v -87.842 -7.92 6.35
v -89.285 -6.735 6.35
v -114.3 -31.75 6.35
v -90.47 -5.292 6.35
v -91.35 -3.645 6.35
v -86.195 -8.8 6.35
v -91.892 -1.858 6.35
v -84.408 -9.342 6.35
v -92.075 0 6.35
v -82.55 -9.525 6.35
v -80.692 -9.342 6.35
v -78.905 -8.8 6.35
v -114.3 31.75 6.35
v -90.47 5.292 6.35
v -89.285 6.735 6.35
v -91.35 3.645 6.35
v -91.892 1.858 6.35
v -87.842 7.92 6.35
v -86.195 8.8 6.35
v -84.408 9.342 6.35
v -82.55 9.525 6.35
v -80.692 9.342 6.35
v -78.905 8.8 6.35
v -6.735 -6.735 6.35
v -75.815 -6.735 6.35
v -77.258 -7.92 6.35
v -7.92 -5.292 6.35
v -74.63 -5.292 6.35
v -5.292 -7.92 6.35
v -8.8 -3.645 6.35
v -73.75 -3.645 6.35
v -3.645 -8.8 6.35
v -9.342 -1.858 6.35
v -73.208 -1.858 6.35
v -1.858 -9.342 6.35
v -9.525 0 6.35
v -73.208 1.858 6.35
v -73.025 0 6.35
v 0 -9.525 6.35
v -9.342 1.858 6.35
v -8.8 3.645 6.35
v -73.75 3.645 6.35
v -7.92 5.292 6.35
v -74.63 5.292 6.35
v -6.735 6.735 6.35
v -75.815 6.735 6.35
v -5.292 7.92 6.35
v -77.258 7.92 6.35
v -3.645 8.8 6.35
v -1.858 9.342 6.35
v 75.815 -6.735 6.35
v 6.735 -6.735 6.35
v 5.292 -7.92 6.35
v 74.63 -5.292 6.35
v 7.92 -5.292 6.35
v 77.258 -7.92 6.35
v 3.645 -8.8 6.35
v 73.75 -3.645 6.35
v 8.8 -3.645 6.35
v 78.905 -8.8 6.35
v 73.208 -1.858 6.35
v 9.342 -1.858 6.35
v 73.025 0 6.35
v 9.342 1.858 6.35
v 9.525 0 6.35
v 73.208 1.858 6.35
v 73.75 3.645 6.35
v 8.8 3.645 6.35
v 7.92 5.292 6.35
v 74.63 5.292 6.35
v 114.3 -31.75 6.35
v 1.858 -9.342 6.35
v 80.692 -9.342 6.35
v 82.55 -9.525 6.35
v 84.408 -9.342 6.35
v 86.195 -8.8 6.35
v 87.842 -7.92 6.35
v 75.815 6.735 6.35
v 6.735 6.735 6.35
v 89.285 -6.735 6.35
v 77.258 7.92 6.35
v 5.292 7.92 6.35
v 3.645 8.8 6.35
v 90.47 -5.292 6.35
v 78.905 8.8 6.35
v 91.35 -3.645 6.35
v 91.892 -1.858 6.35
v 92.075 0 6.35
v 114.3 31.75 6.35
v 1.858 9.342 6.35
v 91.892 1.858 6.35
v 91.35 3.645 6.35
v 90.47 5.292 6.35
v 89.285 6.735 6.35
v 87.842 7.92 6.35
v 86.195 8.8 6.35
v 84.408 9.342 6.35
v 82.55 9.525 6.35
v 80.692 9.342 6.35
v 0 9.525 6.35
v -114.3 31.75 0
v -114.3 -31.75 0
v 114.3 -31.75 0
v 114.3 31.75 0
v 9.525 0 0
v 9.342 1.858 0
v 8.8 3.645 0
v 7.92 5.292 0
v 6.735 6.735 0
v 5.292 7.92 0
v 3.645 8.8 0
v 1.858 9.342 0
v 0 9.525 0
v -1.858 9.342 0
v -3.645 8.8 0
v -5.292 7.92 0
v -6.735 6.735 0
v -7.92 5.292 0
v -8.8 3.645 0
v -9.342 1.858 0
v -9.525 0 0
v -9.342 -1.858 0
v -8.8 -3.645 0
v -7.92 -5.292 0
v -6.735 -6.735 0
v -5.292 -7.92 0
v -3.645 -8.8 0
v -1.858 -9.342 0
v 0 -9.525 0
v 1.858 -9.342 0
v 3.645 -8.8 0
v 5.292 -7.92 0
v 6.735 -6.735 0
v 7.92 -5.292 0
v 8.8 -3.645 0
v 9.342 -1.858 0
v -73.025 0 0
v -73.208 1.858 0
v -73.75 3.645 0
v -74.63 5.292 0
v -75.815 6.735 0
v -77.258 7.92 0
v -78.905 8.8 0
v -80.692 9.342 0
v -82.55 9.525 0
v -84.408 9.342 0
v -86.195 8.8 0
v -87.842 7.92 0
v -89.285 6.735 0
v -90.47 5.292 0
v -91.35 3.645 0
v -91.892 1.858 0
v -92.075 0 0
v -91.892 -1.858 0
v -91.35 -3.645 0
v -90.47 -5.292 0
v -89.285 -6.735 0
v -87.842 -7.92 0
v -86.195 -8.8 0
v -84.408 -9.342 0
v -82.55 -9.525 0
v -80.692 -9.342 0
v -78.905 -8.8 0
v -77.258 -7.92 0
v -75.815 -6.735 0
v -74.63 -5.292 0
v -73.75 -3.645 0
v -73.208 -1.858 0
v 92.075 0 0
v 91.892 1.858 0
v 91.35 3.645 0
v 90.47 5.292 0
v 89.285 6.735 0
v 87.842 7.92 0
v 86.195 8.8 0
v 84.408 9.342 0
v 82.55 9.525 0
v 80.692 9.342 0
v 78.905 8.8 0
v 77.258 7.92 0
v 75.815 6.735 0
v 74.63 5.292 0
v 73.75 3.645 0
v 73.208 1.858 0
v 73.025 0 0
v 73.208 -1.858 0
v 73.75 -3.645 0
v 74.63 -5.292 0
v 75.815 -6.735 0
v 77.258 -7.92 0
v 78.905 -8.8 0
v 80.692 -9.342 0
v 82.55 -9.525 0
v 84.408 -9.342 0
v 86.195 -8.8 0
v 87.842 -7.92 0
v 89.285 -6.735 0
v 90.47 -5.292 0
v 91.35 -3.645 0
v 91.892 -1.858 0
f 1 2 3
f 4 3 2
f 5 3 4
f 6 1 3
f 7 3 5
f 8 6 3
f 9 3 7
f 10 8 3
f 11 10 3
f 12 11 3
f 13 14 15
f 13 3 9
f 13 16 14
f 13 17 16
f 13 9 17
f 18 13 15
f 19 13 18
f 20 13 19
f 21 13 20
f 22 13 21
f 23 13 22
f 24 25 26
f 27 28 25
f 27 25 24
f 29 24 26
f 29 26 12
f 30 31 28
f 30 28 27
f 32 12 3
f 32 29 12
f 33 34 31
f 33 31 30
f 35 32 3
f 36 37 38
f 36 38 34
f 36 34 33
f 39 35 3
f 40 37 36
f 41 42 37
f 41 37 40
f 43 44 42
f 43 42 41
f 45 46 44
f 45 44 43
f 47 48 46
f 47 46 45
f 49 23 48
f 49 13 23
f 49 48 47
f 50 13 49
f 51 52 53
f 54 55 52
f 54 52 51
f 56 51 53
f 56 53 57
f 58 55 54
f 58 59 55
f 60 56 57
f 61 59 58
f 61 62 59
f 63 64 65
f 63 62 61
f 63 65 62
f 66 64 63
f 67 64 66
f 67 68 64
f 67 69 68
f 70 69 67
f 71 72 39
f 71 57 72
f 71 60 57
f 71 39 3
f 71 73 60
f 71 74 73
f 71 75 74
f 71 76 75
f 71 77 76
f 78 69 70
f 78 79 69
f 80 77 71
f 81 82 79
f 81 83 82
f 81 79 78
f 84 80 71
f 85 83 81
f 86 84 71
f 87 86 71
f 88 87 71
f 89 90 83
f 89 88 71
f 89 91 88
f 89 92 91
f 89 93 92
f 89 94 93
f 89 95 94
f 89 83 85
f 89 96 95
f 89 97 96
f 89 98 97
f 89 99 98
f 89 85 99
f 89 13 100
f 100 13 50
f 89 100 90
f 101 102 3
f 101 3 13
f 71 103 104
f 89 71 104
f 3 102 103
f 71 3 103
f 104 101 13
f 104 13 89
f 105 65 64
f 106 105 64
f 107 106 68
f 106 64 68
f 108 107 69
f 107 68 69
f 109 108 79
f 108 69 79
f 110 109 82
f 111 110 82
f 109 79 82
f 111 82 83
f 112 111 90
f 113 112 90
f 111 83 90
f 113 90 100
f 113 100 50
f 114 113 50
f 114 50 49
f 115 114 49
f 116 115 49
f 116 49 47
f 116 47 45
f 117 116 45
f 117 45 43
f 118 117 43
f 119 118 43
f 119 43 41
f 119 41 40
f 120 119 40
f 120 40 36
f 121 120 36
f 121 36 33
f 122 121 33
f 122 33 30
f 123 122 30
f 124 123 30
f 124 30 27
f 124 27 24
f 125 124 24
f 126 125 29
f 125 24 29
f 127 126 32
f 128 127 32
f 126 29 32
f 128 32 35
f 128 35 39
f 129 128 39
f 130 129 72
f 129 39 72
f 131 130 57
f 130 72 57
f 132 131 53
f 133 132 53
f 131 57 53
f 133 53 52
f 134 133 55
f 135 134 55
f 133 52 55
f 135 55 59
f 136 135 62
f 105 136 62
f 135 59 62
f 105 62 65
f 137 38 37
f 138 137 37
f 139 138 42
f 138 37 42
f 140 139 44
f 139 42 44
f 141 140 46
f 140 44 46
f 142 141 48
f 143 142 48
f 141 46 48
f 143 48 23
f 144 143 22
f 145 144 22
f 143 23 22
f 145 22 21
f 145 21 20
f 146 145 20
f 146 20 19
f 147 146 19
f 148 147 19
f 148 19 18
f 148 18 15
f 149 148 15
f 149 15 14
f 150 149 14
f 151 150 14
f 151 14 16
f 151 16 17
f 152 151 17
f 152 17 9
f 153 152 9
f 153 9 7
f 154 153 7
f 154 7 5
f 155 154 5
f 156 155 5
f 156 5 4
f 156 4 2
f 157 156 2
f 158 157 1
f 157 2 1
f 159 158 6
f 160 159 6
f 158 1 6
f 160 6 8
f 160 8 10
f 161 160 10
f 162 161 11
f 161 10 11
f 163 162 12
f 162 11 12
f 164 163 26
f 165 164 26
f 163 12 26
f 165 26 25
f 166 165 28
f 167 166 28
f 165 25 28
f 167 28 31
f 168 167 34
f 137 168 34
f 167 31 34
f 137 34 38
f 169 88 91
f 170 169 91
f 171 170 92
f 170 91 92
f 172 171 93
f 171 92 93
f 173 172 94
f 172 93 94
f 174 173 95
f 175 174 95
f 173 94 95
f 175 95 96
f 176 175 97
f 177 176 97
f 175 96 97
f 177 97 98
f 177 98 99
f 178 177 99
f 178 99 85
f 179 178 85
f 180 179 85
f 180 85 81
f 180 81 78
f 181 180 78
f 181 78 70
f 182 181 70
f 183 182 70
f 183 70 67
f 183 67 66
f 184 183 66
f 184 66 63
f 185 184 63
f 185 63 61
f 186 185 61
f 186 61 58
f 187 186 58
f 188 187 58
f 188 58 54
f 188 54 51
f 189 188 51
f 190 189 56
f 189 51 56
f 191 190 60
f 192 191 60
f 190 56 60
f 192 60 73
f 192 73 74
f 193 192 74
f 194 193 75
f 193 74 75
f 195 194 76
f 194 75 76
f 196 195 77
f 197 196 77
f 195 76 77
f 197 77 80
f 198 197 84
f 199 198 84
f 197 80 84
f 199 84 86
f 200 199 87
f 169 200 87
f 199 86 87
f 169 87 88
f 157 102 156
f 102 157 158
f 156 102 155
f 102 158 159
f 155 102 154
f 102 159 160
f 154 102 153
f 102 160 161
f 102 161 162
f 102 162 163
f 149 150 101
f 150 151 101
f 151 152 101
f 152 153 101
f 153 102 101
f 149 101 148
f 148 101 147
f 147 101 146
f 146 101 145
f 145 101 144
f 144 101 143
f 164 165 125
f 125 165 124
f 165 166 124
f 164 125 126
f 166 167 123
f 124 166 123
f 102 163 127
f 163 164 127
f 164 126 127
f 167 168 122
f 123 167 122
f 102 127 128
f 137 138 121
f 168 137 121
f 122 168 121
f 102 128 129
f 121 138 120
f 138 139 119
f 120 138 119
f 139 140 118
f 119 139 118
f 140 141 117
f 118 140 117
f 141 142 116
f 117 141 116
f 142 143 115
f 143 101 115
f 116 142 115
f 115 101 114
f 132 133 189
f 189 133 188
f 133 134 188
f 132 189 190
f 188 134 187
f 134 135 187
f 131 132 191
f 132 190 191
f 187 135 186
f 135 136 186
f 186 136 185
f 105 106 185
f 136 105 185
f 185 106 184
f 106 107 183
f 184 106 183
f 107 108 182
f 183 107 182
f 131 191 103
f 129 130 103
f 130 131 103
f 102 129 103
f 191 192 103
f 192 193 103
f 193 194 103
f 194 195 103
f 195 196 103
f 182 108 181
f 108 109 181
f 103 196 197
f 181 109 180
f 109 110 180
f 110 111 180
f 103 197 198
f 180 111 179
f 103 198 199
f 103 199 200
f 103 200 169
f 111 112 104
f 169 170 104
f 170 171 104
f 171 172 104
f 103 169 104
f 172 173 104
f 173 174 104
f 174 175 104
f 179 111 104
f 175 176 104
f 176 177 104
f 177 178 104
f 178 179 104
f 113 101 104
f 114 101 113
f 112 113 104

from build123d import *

# Parameters (mm, degrees)
SKETCH1_W           = 228.6
SKETCH1_H           = 63.5
BOSS_EXTRUDE1_DEPTH = 6.35
SKETCH2_R           = 9.525
CUT_EXTRUDE1_DEPTH  = 7.35
LPATTERN1_COUNT     = 3
LPATTERN1_PITCH     = 82.55


with BuildPart() as part:
    # Sketch1 → Boss-Extrude1 (new body)
    with BuildSketch(Plane.XY):
        Rectangle(SKETCH1_W, SKETCH1_H)
    extrude(amount=BOSS_EXTRUDE1_DEPTH)

    # Sketch2 → Cut-Extrude1 (cut, through all)
    with BuildSketch(Plane.XY.offset(6.35)):
        with Locations((-82.55, 0)):
            Circle(SKETCH2_R)
    cut_extrude1 = extrude(amount=-CUT_EXTRUDE1_DEPTH, mode=Mode.SUBTRACT)

    # LPattern1: Cut-Extrude1 ×3
    with Locations(*[(i * LPATTERN1_PITCH, 0, 0) for i in range(1, LPATTERN1_COUNT)]):
        add(cut_extrude1, mode=Mode.SUBTRACT)


solid = part.part
